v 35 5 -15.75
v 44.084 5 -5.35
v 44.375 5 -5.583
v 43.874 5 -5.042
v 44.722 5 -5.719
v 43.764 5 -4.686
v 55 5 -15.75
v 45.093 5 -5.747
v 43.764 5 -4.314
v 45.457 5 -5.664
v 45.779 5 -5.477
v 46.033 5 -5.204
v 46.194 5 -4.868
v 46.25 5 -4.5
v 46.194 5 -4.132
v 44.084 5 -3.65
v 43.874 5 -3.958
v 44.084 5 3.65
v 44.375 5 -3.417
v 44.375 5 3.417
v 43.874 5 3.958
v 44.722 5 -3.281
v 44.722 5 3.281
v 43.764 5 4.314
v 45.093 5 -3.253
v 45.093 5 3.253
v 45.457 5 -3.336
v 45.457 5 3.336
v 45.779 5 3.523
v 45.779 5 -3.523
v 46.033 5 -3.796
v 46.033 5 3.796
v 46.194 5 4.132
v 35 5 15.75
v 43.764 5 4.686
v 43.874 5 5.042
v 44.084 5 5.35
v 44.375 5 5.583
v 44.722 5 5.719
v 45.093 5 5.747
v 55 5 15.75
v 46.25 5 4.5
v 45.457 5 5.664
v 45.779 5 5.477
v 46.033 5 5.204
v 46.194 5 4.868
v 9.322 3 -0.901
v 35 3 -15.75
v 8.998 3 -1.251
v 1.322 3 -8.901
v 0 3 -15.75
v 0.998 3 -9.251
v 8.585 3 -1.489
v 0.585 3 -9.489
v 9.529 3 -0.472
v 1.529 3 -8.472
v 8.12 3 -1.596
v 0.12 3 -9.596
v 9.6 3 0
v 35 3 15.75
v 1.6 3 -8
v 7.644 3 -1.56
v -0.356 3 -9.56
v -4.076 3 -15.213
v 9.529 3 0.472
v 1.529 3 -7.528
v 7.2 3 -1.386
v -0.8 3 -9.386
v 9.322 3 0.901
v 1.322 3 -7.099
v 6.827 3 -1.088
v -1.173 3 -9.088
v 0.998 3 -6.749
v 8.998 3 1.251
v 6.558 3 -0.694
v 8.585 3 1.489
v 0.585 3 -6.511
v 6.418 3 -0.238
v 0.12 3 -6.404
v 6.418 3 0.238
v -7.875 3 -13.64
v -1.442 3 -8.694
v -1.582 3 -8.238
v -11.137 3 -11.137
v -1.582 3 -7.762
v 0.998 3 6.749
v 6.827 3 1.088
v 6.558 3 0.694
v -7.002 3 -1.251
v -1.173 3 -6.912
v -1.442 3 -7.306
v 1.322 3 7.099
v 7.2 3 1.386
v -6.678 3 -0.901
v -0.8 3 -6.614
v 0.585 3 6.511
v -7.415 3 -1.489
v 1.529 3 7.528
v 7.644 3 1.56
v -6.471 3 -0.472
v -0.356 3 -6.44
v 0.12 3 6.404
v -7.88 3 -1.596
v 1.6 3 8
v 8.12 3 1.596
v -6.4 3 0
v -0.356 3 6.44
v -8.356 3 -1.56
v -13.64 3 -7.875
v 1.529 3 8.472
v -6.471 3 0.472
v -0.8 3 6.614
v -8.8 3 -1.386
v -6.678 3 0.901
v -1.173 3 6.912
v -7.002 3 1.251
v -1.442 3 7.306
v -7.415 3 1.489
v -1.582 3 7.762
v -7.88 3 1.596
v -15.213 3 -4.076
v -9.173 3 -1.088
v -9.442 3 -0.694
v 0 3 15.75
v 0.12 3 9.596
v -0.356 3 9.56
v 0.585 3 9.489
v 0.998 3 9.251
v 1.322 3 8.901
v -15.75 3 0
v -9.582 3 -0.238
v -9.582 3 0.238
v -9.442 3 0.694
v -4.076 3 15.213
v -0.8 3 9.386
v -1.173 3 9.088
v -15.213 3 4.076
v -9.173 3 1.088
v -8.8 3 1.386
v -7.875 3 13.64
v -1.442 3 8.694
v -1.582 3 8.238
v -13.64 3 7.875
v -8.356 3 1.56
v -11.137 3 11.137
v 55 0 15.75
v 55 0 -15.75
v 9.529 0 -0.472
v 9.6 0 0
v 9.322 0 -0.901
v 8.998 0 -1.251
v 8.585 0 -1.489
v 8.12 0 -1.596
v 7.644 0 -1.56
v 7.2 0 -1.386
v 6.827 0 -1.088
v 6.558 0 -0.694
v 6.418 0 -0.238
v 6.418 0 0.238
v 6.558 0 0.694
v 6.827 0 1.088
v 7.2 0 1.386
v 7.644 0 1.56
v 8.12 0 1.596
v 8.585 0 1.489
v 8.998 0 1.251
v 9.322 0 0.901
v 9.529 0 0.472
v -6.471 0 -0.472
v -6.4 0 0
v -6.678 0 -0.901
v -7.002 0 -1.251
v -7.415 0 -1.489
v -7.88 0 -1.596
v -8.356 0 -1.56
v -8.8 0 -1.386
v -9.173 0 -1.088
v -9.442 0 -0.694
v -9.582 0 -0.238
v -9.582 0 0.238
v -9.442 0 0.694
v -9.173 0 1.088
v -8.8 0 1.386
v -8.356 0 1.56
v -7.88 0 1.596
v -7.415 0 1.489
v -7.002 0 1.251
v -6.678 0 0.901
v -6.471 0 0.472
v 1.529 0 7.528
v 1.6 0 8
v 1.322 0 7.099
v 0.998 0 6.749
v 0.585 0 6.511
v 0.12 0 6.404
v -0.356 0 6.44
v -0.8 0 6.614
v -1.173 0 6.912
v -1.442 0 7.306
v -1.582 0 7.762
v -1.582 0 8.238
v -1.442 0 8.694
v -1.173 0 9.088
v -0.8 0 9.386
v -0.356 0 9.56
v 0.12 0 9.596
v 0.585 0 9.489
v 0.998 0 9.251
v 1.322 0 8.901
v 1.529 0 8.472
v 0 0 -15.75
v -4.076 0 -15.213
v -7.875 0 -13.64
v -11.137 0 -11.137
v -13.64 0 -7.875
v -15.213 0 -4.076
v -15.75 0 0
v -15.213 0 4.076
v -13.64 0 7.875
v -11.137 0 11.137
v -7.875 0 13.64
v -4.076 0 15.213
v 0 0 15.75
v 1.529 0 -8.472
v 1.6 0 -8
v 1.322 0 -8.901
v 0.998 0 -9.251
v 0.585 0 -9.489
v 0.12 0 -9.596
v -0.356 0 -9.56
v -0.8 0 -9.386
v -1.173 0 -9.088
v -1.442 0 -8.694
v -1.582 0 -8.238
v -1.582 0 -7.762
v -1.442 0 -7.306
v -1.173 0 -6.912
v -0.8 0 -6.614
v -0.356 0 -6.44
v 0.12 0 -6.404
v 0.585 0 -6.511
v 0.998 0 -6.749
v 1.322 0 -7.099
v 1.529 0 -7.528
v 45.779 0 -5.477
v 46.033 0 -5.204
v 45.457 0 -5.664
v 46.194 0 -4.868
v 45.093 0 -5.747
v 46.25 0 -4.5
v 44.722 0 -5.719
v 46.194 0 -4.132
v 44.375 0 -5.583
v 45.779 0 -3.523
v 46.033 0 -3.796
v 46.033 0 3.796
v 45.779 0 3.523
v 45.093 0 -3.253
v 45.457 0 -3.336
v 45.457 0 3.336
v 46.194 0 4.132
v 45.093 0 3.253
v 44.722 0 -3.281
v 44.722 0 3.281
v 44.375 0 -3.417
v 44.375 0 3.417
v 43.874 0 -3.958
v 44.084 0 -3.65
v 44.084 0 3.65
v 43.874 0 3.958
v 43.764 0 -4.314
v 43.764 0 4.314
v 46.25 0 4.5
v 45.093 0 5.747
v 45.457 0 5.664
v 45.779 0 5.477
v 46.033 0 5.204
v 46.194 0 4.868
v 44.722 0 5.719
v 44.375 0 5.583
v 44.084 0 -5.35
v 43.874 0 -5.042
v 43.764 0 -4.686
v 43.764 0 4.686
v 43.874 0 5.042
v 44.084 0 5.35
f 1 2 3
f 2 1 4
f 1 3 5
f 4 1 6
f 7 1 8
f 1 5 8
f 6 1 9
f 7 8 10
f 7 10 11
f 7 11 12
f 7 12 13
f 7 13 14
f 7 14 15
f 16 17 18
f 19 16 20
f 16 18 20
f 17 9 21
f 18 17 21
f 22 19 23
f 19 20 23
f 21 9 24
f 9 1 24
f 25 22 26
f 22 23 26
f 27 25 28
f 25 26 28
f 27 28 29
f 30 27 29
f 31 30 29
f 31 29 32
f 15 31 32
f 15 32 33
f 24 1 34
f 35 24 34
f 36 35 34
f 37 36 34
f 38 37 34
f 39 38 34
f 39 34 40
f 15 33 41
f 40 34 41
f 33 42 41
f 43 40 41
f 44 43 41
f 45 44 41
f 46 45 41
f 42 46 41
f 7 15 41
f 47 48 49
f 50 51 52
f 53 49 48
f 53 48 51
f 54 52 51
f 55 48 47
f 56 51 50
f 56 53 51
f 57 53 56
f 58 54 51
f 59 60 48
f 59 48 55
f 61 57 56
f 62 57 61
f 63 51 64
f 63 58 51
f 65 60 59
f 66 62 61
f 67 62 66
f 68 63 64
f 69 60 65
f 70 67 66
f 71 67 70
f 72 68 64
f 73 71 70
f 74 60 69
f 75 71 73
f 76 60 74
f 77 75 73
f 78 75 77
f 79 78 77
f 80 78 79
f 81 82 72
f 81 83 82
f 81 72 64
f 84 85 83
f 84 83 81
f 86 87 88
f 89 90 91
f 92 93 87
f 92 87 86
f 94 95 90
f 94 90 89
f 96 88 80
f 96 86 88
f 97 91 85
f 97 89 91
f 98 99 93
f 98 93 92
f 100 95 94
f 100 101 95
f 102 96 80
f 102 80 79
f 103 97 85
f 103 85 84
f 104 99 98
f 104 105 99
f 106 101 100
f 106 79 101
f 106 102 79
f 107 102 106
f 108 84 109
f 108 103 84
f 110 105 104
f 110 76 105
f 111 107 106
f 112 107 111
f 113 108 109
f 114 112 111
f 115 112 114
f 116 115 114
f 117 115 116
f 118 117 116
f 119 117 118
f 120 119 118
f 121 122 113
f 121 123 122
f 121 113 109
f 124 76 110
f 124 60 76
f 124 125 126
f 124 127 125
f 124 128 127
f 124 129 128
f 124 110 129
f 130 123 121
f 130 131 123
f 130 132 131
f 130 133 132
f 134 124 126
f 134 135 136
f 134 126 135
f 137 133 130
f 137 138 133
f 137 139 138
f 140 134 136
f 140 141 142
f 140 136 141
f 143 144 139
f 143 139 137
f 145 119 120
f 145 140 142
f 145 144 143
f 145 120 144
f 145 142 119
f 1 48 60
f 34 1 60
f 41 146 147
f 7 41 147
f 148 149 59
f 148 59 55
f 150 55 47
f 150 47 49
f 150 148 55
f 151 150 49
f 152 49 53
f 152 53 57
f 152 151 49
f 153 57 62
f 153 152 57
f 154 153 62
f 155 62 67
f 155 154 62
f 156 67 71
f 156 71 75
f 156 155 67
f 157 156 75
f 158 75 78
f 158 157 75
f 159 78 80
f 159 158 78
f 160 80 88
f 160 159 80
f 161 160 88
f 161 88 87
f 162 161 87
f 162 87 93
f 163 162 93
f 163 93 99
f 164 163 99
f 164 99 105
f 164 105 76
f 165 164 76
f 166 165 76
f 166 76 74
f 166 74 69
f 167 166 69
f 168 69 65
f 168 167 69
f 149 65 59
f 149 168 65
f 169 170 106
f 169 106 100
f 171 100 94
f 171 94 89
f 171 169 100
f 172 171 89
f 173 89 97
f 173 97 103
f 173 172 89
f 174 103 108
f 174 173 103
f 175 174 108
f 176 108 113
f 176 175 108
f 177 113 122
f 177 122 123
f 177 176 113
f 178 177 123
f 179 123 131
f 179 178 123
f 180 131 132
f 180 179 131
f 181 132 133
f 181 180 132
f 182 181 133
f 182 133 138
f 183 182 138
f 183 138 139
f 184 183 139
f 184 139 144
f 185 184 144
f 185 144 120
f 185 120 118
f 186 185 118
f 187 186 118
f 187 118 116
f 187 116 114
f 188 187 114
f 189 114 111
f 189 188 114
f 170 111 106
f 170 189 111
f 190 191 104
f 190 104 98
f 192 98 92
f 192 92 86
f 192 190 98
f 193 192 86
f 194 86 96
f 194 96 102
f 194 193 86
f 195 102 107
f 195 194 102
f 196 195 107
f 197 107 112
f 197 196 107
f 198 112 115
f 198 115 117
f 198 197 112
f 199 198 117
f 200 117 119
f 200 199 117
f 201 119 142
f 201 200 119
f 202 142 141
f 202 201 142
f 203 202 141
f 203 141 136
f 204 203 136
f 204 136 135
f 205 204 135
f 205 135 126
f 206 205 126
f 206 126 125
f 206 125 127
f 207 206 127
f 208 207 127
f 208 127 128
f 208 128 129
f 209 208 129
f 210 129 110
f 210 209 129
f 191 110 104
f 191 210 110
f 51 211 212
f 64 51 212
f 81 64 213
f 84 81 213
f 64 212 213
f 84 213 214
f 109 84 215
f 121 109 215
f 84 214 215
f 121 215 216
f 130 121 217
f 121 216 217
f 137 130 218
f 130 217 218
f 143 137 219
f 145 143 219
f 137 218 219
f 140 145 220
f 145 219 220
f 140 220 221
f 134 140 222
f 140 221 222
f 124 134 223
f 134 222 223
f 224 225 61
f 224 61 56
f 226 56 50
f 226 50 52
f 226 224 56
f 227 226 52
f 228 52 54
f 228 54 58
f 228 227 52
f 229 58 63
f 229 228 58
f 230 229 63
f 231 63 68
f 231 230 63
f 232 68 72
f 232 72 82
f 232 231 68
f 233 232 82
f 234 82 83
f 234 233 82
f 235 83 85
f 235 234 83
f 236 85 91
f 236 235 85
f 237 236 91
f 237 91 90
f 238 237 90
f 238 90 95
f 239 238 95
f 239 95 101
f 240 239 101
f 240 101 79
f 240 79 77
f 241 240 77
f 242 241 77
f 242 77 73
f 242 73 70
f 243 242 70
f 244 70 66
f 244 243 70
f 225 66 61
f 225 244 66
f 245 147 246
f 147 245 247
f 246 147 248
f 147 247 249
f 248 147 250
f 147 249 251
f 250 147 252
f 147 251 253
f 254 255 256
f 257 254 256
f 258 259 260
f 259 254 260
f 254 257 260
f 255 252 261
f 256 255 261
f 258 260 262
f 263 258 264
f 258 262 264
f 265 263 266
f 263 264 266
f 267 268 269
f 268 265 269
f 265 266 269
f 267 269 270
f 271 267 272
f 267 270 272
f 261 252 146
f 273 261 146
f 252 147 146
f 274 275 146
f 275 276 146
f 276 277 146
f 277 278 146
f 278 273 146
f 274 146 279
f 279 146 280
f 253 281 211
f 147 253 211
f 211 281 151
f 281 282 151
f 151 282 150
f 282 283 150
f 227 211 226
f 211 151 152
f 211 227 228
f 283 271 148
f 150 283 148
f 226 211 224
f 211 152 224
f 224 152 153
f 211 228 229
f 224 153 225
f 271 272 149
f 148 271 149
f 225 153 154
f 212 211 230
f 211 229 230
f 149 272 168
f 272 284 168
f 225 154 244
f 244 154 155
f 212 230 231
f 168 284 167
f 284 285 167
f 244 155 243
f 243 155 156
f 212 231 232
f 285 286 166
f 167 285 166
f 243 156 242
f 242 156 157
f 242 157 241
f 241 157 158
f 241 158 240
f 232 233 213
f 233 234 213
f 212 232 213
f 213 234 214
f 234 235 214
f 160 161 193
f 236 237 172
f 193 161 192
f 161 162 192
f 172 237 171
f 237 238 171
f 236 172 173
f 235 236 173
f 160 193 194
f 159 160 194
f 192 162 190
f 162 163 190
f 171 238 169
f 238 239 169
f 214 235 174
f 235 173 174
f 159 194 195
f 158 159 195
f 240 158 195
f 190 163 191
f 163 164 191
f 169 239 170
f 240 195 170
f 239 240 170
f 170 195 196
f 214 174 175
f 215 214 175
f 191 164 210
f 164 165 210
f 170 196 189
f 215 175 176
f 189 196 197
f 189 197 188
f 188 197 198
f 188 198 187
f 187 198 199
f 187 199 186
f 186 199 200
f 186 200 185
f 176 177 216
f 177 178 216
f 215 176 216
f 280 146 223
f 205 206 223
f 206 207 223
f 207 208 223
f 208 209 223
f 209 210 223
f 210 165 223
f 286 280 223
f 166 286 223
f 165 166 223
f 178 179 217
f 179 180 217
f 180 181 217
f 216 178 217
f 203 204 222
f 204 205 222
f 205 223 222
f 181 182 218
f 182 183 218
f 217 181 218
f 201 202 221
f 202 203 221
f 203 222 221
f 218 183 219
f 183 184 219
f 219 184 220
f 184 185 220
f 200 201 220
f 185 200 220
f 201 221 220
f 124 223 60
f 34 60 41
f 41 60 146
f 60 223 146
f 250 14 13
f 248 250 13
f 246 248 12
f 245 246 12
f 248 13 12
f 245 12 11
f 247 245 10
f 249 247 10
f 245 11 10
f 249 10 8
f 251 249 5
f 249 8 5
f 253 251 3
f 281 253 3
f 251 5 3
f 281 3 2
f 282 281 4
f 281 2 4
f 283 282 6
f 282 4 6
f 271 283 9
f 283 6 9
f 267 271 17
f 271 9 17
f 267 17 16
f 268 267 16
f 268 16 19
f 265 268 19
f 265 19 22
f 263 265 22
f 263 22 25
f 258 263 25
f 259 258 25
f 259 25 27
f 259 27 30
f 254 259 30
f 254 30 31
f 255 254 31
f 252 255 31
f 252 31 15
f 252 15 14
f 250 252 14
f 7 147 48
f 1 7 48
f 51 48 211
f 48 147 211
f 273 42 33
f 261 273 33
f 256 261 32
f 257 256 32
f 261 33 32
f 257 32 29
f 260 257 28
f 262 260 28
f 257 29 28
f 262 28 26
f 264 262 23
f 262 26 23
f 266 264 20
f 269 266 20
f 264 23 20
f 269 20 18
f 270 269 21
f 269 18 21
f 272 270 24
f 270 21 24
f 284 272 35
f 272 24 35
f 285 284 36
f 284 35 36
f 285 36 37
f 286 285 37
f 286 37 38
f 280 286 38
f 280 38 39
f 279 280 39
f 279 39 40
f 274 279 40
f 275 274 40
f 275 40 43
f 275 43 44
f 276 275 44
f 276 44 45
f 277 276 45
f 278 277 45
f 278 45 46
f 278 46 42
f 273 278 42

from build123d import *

# Parameters (mm, degrees)
SKETCH_1_R          = 15.75
SKETCH_1_R_2        = 1.6
EXTRUDE_1_DEPTH     = 3
EXTRUDE_2_DEPTH     = 3
SKETCH_3_W          = 20
SKETCH_3_H          = 31.5
EXTRUDE_3_DEPTH     = 5
SKETCH_4_R          = 1.25
CUT_EXTRUDE_1_DEPTH = 10


with BuildPart() as part:
    # 草图1 → 凸台-拉伸1 (new body)
    with BuildSketch(Plane(origin=(0, 0, 0), x_dir=(1, 0, 0), z_dir=(0, 1, 0))):
        Circle(SKETCH_1_R)
        with Locations((0, 8)):
            Circle(SKETCH_1_R_2, mode=Mode.SUBTRACT)
        with Locations((8, 0)):
            Circle(SKETCH_1_R_2, mode=Mode.SUBTRACT)
        with Locations((0, -8)):
            Circle(SKETCH_1_R_2, mode=Mode.SUBTRACT)
        with Locations((-8, 0)):
            Circle(SKETCH_1_R_2, mode=Mode.SUBTRACT)
    extrude(amount=EXTRUDE_1_DEPTH)

    # 草图2 → 凸台-拉伸2 (add)
    with BuildSketch(Plane.XZ):
        with BuildLine():
            Line((0, 15.75), (55, 15.75))
            Line((55, 15.75), (55, -15.75))
            Line((55, -15.75), (0, -15.75))
            ThreePointArc((0, -15.75), (15.75, 0), (0, 15.75))
        make_face()
    extrude(amount=-EXTRUDE_2_DEPTH)

    # 草图3 → 凸台-拉伸3 (add)
    with BuildSketch(Plane.XZ):
        with Locations((45, 0)):
            Rectangle(SKETCH_3_W, SKETCH_3_H)
    extrude(amount=-EXTRUDE_3_DEPTH)

    # 草图4 → 切除-拉伸1 (cut)
    with BuildSketch(Plane(origin=(0, 5, 0), x_dir=(1, 0, 0), z_dir=(0, 1, 0))):
        with Locations((45, 4.5)):
            Circle(SKETCH_4_R)
        with Locations((45, -4.5)):
            Circle(SKETCH_4_R)
    extrude(amount=-CUT_EXTRUDE_1_DEPTH, mode=Mode.SUBTRACT)


solid = part.part
